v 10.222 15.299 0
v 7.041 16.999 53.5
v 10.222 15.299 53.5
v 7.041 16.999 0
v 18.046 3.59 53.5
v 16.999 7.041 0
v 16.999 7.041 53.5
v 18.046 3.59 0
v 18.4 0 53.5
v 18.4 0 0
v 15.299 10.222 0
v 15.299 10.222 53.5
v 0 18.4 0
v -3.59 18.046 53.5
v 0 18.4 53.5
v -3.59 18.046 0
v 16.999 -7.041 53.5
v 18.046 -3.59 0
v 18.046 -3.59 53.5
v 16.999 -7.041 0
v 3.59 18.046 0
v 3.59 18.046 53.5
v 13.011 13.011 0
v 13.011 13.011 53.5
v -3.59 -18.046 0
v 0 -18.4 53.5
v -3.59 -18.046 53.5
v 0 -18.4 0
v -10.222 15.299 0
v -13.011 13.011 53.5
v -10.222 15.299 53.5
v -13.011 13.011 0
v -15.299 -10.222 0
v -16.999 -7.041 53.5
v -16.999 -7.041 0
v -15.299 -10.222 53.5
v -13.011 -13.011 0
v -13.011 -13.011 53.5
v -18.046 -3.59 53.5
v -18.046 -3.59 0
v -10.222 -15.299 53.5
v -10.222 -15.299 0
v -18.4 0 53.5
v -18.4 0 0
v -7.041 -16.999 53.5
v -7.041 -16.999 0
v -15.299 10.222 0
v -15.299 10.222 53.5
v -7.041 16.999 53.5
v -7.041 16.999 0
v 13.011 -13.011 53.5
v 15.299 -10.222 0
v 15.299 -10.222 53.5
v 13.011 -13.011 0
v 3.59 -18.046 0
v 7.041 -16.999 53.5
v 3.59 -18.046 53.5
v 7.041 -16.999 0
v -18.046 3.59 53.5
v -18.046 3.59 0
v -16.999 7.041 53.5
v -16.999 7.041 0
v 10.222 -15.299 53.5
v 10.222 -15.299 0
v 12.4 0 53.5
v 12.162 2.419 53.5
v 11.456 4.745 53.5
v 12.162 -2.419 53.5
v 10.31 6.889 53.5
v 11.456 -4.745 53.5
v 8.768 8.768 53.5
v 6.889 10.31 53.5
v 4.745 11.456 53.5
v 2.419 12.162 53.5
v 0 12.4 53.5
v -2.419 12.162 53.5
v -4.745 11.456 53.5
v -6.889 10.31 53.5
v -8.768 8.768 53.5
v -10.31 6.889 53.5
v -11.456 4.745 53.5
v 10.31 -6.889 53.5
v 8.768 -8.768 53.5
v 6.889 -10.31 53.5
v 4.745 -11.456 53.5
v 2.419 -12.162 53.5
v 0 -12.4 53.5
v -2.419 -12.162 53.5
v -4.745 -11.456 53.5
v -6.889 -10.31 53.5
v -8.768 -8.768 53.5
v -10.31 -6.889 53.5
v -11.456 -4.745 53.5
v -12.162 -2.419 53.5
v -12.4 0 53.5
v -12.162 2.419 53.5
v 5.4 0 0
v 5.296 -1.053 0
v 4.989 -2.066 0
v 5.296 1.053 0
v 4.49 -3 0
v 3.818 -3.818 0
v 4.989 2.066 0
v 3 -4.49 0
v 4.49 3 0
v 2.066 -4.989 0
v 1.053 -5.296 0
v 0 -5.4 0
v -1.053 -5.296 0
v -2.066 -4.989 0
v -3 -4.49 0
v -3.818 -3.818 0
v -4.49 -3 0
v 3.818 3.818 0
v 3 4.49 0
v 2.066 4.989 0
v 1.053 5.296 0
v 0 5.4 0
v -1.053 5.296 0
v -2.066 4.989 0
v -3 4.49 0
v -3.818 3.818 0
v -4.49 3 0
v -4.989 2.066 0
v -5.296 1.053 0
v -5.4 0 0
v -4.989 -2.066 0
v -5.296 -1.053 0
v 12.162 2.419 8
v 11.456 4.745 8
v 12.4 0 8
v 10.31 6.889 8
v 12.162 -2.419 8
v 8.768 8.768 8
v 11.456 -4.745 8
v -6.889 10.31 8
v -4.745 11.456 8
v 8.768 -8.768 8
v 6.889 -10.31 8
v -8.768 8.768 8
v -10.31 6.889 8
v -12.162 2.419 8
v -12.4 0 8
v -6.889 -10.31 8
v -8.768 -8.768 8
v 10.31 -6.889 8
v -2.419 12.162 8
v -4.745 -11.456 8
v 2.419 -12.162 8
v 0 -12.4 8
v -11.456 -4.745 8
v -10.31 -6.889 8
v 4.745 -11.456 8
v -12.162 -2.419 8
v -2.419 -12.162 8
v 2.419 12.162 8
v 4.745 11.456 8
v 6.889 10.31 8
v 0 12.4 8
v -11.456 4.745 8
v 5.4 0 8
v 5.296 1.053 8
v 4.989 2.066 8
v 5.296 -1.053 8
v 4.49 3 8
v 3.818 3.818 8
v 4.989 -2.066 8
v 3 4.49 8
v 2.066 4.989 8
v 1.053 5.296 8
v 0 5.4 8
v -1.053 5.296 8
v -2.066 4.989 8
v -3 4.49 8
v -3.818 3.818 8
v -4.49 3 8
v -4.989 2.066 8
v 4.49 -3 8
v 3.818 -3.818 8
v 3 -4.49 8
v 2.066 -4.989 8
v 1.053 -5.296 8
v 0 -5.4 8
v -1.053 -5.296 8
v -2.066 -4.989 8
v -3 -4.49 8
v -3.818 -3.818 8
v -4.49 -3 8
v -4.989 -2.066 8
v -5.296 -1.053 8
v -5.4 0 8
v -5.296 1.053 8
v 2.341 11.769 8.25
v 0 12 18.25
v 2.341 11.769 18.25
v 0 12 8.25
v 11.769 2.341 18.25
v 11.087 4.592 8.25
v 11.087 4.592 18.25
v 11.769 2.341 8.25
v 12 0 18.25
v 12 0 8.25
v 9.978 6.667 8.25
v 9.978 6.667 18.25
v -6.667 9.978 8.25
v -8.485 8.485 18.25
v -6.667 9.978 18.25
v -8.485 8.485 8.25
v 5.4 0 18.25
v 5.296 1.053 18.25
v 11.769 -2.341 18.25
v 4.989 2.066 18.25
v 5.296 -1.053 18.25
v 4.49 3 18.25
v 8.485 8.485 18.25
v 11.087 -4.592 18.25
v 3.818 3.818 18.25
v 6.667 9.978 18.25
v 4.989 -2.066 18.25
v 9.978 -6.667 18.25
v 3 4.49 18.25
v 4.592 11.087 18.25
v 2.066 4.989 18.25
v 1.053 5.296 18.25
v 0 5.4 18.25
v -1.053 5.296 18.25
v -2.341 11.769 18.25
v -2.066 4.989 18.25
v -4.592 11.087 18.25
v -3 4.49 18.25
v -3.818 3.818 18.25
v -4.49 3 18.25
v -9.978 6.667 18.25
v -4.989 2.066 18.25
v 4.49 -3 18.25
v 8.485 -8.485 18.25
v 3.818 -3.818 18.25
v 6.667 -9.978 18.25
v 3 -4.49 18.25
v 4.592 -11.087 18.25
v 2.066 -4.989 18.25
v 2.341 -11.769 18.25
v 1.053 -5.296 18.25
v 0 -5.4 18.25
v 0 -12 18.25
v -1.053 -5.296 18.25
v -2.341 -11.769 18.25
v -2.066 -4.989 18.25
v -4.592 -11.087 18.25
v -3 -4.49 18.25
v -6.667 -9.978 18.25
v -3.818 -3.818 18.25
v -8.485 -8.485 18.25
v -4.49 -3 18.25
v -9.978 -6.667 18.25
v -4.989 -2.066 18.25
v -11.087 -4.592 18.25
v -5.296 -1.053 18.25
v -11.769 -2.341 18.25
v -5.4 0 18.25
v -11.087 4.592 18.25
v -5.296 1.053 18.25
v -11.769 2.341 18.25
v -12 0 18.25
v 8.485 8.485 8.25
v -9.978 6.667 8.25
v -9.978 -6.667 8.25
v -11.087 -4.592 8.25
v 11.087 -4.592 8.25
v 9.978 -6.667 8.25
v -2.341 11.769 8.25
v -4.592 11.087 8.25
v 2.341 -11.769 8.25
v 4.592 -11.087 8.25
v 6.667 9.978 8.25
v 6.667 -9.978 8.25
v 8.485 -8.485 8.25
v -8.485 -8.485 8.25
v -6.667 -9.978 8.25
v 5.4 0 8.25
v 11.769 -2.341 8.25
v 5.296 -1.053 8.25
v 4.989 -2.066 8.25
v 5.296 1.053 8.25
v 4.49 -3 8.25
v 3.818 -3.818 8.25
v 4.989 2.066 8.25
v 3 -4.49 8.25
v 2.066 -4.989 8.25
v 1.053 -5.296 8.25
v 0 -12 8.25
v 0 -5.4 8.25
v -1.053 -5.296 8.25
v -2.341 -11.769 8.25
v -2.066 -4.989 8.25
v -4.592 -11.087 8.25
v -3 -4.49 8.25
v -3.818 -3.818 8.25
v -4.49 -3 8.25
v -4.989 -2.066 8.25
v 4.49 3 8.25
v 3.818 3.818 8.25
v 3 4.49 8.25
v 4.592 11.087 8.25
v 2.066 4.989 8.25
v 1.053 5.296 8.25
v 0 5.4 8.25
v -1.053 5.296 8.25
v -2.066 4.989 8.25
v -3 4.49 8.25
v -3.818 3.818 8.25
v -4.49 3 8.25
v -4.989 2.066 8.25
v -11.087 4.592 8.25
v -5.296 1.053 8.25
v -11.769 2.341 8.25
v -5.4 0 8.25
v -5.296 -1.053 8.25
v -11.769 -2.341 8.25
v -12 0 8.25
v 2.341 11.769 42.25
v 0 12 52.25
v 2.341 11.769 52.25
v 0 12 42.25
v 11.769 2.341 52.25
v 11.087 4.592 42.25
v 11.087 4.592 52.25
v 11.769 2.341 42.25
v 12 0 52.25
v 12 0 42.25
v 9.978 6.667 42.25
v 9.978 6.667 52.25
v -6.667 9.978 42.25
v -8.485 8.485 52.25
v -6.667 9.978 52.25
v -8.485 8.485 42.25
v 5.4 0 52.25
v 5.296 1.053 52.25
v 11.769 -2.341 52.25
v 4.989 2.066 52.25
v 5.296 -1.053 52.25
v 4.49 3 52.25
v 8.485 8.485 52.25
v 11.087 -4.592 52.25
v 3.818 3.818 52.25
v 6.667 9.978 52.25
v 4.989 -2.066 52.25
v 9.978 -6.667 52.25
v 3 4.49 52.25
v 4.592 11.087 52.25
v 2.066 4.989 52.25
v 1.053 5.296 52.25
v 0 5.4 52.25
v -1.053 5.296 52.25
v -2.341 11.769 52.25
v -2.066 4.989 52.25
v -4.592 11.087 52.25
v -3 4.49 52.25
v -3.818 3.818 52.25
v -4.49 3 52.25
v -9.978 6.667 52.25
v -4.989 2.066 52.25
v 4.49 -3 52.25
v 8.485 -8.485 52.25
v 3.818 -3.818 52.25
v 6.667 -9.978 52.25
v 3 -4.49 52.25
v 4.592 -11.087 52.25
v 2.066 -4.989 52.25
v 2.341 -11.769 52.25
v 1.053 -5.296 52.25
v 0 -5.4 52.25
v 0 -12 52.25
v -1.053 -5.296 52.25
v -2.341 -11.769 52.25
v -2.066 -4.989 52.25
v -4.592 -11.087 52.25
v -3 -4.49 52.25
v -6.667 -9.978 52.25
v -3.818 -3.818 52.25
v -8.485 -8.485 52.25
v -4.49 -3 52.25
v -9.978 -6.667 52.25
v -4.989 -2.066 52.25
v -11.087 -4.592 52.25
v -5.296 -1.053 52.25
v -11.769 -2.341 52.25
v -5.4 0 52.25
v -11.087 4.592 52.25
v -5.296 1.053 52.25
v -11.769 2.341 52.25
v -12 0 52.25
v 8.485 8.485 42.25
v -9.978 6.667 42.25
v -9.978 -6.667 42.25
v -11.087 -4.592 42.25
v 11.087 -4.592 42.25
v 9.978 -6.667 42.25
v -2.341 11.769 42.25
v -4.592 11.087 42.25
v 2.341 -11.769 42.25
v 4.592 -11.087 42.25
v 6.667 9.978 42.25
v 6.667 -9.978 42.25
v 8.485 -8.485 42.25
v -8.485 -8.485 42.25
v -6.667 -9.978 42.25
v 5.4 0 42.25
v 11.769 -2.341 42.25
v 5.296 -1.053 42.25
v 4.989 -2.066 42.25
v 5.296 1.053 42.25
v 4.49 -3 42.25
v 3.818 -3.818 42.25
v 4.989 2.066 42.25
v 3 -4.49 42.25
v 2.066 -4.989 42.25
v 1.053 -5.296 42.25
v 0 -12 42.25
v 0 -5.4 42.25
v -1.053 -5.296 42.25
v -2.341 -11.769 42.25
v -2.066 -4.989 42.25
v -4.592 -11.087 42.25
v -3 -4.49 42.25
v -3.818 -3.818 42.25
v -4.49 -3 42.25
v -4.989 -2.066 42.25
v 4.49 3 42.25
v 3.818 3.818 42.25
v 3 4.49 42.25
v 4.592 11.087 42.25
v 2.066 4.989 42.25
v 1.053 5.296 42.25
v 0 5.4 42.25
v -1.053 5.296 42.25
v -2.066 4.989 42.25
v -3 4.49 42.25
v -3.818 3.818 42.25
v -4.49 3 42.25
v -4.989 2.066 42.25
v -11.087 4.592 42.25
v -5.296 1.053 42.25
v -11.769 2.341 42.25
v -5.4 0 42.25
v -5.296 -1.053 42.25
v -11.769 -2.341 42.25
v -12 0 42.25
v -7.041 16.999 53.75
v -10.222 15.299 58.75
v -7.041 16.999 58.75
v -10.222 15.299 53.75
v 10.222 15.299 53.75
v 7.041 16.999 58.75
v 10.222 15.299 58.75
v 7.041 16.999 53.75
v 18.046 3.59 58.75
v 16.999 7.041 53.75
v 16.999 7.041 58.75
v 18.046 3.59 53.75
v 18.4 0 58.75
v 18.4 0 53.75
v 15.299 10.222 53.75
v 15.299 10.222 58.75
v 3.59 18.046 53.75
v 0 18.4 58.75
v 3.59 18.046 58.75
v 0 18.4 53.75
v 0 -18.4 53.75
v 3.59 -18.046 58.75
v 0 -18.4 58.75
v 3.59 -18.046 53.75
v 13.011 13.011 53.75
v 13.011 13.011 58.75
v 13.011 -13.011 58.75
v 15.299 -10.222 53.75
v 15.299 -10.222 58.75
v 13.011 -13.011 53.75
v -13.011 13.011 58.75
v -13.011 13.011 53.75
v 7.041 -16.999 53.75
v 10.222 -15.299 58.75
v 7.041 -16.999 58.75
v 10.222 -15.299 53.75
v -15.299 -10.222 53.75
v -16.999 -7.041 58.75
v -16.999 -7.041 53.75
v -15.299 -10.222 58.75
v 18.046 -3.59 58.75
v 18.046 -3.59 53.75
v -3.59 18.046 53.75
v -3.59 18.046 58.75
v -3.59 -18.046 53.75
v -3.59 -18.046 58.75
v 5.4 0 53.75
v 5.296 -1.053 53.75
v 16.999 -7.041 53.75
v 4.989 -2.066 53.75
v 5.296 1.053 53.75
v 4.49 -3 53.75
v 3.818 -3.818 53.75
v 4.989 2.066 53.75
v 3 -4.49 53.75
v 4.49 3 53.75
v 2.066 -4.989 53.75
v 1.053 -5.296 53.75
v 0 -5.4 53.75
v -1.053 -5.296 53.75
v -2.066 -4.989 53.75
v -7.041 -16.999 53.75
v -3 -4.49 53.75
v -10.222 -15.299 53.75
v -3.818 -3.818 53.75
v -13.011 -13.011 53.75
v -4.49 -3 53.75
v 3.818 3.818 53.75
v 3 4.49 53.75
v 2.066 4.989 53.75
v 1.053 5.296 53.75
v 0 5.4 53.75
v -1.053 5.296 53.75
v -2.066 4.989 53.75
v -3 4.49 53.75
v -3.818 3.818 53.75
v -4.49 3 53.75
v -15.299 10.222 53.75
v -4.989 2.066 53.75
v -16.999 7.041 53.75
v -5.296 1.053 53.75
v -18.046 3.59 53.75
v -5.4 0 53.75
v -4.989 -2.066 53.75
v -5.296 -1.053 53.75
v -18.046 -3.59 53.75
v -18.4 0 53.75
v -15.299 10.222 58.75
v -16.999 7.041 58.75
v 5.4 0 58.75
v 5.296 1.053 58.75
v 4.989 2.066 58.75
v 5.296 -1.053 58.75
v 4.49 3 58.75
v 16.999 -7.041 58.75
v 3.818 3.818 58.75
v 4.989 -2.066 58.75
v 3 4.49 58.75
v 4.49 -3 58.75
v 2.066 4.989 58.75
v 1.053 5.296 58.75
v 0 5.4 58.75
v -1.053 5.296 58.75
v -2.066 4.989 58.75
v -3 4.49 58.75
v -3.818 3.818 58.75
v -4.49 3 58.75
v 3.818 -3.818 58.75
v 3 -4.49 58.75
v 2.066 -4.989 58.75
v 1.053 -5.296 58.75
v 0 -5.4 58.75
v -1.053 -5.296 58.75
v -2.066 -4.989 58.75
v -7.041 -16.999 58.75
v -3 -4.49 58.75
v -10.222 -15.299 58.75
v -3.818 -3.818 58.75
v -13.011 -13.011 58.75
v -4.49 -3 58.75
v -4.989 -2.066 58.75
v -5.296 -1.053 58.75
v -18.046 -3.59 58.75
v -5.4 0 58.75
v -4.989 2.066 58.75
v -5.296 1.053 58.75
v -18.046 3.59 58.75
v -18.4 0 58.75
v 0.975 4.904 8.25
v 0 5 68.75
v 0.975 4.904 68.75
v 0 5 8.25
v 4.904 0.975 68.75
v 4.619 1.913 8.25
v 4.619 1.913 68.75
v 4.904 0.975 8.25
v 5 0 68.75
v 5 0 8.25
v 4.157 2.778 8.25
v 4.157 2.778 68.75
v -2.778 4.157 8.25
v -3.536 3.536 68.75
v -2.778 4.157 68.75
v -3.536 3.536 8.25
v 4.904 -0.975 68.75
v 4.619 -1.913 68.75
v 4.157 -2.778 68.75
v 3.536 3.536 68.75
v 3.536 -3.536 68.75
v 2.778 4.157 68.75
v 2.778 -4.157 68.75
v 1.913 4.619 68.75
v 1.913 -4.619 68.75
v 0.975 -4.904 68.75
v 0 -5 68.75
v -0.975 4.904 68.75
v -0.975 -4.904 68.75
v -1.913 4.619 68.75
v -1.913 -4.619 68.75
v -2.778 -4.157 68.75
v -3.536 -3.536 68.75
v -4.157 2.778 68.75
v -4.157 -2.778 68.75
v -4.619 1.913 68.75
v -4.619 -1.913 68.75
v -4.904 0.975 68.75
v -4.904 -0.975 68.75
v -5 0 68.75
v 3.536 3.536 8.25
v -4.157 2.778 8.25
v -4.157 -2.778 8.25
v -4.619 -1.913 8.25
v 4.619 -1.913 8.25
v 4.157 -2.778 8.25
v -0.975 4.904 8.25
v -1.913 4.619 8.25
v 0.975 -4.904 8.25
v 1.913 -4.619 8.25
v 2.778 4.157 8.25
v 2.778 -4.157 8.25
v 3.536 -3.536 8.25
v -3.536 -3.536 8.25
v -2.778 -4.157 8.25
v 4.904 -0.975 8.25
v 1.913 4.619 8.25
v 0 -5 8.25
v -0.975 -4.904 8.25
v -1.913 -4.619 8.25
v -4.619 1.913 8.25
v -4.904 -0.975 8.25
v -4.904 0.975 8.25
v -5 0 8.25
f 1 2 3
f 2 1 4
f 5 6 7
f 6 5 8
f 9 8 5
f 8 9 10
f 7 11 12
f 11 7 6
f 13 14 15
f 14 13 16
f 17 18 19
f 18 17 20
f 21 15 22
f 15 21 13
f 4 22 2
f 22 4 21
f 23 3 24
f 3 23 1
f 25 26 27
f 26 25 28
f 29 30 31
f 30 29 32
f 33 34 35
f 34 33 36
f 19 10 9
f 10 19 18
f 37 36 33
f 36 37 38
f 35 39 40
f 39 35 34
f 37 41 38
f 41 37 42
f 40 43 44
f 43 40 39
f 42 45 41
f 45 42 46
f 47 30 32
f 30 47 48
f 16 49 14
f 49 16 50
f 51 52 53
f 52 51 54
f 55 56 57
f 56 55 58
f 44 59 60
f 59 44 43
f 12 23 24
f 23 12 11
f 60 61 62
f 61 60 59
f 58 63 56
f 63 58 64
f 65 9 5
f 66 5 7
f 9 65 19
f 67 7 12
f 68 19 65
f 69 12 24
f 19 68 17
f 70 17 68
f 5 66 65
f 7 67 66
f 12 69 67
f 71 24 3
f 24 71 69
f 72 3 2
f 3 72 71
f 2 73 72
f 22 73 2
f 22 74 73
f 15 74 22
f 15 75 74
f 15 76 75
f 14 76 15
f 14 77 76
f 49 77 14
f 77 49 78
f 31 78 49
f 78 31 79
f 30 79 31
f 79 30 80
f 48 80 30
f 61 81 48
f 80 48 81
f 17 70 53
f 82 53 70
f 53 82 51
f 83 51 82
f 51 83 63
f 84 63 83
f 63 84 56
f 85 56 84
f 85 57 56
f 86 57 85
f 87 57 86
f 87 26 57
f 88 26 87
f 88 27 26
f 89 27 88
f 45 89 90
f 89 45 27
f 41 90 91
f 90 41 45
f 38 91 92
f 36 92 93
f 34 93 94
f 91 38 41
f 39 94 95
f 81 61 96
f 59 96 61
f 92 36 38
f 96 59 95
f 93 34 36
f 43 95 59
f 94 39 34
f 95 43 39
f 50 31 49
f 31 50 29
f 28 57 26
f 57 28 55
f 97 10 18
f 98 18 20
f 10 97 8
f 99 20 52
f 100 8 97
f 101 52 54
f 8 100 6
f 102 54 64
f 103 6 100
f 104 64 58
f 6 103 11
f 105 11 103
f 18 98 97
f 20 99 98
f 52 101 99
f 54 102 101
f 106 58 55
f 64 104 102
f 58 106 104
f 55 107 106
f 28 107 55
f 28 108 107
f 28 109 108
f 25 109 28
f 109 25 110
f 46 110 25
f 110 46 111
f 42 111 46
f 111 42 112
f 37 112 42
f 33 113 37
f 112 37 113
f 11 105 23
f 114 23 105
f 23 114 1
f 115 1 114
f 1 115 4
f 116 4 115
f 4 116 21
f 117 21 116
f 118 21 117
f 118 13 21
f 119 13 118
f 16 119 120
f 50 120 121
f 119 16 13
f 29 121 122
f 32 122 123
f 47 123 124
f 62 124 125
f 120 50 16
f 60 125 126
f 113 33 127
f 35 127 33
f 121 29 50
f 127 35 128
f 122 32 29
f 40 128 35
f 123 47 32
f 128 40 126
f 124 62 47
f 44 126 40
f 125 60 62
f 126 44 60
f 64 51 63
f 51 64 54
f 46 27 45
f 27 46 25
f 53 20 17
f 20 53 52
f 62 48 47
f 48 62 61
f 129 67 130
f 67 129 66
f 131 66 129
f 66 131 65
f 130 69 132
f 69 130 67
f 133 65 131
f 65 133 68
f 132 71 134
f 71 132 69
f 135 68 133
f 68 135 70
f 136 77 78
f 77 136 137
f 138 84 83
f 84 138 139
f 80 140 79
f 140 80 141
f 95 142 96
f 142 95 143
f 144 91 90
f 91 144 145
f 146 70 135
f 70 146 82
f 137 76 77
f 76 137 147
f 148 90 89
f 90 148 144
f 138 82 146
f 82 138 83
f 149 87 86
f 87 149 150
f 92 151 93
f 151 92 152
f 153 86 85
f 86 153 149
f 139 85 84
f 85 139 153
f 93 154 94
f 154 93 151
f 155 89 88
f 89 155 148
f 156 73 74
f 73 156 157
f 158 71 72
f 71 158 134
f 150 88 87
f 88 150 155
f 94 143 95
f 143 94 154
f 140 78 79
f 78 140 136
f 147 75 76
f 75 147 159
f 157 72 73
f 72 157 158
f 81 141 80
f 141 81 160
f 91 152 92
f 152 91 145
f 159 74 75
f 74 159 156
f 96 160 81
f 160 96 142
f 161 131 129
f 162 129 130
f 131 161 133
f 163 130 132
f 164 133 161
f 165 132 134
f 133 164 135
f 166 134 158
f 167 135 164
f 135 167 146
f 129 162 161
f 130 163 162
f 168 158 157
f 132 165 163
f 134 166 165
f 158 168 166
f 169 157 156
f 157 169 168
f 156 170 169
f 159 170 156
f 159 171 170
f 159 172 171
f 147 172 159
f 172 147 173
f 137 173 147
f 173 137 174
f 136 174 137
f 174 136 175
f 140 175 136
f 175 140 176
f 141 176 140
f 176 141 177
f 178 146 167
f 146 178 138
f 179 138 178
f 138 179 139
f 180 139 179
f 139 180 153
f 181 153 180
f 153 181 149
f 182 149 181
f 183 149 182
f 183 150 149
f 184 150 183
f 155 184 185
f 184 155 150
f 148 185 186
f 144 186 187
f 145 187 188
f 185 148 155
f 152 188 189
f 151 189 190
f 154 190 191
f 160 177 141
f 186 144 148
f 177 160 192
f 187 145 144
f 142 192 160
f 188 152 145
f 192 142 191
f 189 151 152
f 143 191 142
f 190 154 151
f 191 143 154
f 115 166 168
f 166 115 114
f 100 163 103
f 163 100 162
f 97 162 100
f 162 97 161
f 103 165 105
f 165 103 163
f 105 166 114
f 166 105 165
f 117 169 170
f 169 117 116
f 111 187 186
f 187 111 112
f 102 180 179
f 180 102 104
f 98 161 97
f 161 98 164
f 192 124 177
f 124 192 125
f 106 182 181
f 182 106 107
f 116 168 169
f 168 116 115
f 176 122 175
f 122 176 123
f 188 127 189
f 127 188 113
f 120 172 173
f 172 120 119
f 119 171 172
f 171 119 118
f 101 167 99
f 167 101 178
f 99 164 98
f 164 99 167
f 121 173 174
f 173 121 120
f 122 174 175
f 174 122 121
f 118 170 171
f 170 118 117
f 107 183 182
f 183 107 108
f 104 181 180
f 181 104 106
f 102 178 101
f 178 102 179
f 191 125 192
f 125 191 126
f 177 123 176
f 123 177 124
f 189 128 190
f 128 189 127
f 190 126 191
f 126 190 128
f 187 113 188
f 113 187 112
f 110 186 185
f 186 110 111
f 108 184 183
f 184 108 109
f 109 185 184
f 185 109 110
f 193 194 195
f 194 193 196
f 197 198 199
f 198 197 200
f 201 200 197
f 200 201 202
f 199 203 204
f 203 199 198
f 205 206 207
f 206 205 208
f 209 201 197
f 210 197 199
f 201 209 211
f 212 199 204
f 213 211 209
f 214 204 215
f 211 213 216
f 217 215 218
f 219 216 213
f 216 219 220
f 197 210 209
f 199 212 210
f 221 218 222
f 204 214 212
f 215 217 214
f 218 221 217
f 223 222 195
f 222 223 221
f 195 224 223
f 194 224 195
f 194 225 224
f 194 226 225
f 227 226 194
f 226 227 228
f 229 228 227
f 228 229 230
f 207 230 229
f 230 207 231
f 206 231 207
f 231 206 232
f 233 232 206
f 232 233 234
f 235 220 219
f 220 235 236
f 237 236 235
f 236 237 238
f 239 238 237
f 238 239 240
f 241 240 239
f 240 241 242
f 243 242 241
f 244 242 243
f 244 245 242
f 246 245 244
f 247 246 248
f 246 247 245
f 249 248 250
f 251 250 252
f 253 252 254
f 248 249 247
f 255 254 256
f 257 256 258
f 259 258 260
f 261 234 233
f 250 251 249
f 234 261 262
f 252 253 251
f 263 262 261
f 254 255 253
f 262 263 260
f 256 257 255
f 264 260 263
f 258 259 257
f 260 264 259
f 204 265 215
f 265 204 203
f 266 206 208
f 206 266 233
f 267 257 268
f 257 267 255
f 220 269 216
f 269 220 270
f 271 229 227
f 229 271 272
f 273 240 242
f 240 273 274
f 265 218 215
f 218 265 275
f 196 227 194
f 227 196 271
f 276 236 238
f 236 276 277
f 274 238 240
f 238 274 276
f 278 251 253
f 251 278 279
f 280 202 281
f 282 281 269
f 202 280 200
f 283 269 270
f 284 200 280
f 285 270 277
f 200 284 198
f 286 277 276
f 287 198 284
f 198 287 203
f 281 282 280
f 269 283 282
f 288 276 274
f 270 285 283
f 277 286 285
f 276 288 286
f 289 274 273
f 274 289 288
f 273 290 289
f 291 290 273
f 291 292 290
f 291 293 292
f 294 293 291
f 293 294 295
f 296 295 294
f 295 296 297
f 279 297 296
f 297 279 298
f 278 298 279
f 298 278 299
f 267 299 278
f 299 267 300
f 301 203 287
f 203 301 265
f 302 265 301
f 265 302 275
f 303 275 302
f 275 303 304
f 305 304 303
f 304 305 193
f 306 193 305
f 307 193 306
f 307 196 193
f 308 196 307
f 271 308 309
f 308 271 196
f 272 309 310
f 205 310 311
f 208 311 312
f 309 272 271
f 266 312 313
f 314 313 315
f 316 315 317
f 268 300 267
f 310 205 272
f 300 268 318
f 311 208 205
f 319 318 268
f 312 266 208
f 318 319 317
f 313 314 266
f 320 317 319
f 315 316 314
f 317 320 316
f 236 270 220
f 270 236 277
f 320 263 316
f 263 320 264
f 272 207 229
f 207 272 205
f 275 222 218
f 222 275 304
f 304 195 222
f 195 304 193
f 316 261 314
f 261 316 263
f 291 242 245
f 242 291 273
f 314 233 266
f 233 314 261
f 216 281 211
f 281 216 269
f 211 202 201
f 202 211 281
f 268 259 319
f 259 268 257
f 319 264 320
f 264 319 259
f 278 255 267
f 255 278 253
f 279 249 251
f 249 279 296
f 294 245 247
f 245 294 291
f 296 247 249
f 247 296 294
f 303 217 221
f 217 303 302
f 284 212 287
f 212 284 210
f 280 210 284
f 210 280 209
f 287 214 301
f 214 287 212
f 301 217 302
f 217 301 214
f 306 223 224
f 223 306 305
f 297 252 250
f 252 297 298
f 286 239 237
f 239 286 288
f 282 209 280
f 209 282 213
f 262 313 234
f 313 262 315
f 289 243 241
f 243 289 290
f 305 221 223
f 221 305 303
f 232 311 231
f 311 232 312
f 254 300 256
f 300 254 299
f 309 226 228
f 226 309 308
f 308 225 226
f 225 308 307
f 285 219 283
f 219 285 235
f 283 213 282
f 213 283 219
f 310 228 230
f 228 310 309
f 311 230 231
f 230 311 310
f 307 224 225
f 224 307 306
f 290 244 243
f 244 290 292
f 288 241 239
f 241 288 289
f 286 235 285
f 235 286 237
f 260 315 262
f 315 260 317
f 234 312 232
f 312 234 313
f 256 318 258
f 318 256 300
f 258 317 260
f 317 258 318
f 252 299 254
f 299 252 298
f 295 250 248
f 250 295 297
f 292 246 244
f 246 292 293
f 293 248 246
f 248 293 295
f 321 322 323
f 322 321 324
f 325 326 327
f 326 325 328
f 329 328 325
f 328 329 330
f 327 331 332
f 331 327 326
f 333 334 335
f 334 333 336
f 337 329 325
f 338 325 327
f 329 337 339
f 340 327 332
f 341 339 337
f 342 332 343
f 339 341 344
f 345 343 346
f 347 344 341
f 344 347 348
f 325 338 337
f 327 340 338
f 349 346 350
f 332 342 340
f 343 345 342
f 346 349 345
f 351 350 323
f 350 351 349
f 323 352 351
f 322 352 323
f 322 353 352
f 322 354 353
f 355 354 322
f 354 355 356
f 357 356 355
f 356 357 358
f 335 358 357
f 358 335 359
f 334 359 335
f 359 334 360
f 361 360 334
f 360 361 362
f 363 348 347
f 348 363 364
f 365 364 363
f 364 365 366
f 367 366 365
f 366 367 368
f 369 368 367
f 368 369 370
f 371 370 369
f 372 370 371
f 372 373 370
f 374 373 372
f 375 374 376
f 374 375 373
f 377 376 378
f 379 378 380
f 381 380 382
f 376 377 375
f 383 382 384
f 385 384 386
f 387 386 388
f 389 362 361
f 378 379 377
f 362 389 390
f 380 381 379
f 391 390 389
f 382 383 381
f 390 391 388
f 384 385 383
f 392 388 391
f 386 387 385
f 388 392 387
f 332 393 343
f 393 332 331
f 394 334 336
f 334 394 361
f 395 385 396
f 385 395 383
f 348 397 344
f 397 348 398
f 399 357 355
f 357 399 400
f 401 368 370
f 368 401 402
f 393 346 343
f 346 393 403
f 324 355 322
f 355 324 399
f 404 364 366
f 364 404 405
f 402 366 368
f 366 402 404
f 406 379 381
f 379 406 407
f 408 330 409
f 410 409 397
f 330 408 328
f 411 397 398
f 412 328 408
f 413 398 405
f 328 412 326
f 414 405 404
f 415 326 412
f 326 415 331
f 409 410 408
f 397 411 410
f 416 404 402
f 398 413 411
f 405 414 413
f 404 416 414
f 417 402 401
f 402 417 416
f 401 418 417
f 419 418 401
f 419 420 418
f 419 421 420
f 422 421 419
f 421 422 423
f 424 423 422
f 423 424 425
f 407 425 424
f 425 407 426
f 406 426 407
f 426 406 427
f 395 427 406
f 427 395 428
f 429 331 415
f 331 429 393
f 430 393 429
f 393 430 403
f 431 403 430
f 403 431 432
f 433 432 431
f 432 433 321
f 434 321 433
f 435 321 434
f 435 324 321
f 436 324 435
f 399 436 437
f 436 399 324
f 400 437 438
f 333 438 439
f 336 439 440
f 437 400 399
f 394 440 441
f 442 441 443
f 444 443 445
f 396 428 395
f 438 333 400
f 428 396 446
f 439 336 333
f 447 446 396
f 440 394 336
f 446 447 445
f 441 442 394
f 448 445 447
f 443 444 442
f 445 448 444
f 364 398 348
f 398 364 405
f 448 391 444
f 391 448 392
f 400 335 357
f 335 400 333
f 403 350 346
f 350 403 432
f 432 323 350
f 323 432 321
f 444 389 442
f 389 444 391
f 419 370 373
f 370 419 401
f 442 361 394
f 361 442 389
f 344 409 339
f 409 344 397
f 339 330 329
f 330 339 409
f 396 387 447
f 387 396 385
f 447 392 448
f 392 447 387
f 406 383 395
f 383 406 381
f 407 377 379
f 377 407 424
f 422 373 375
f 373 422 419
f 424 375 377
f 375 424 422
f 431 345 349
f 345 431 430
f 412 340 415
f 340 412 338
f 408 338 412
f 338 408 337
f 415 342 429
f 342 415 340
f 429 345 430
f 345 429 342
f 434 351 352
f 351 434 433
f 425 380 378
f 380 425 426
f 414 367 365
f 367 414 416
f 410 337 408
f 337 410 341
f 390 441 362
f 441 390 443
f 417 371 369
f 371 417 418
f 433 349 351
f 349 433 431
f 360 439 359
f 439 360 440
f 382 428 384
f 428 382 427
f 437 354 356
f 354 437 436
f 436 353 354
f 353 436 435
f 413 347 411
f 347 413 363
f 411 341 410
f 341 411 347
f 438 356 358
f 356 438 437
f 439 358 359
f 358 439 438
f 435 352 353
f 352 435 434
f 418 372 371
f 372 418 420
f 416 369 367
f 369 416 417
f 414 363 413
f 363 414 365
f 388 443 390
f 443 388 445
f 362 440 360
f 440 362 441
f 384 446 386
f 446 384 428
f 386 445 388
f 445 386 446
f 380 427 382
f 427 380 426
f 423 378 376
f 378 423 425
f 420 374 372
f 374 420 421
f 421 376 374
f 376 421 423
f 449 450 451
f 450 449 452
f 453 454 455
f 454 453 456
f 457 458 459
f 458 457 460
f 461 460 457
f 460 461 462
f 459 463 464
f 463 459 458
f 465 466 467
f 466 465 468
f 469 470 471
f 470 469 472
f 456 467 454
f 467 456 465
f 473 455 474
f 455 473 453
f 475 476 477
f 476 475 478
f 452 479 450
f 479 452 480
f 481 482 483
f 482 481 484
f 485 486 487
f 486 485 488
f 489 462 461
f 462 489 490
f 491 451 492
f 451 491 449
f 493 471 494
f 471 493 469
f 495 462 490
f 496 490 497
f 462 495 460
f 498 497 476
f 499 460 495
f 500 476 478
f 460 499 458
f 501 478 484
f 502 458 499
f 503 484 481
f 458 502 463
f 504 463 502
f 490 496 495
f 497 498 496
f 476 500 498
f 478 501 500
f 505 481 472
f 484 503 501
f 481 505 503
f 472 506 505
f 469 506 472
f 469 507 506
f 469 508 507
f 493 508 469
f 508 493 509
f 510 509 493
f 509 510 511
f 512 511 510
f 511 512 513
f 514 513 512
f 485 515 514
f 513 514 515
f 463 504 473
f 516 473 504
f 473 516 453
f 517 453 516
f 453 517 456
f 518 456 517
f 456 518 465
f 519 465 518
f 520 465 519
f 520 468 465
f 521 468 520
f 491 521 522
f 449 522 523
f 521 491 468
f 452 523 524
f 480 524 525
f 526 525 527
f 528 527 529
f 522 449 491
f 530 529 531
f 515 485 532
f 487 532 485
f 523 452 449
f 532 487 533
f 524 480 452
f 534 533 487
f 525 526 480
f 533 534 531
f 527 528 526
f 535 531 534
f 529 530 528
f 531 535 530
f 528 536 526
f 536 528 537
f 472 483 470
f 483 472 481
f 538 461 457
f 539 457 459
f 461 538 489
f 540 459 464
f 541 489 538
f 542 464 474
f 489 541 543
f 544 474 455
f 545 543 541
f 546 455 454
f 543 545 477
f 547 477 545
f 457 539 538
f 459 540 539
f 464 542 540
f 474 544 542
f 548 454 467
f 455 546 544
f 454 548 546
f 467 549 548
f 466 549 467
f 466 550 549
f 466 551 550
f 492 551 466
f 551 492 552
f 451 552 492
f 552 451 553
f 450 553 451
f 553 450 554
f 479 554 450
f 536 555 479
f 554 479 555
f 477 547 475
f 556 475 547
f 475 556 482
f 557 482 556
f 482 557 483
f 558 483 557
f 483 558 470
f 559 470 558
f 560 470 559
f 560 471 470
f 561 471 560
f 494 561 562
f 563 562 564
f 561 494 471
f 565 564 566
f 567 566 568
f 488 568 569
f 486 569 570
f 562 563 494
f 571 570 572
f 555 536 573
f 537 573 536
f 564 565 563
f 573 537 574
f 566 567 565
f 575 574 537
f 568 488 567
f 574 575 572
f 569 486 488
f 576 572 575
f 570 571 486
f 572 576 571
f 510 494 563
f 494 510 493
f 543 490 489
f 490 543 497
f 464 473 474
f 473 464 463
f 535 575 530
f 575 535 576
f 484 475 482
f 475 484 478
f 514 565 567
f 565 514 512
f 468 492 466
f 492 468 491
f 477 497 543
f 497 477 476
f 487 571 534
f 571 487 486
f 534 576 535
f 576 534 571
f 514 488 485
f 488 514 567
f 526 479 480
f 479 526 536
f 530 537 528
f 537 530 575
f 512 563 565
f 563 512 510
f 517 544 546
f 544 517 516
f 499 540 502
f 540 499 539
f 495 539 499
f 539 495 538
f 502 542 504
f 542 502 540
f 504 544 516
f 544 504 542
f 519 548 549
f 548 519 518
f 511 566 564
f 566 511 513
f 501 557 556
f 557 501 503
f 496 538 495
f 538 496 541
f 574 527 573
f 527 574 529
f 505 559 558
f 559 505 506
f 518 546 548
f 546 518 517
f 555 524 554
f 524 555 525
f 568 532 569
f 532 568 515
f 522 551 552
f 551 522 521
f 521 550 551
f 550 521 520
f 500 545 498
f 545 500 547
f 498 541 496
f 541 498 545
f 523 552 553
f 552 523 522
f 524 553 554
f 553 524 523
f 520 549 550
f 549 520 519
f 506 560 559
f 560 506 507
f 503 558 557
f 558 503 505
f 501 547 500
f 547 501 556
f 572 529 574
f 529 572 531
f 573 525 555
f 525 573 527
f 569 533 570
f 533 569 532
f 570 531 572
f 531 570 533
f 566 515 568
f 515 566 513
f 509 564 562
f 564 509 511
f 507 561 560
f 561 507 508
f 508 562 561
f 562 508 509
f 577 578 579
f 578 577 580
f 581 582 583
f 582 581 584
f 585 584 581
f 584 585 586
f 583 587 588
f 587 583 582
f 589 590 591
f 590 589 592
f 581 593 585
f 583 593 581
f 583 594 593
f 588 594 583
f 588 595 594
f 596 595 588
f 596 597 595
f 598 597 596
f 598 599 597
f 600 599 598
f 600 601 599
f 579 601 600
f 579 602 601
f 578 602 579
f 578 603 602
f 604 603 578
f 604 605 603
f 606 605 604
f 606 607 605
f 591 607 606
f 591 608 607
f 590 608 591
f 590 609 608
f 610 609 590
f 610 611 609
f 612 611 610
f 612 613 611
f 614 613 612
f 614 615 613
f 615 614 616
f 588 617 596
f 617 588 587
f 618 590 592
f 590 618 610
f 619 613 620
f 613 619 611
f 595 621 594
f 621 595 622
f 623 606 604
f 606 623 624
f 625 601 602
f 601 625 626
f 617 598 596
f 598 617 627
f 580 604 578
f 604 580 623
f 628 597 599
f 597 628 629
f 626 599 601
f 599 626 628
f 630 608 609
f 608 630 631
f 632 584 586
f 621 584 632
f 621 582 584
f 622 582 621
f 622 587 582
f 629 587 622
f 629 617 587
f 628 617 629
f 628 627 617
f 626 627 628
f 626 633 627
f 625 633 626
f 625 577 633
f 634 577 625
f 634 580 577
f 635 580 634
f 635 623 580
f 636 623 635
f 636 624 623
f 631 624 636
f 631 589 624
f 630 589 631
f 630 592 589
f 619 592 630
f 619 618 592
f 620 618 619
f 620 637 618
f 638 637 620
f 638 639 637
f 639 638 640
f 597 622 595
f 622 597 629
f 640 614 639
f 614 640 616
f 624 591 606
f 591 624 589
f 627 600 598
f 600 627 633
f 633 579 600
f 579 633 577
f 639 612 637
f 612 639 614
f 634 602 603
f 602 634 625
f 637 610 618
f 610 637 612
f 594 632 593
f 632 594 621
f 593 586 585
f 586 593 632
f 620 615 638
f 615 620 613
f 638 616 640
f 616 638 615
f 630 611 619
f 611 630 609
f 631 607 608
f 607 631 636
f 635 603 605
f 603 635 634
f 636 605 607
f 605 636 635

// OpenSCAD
$fn = 32;

// ------------------------------------------------------------------------
// Shaft station: cup d36.8 x 53.5 mm, shaft d10
// Every part is its own module, assembly() places every instance.
// ------------------------------------------------------------------------

// --- part 1 ---
module housing_cup() {
  difference() {
    cylinder(h = 53.5, d = 36.8);
    translate([0, 0, 8]) cylinder(h = 46.5, d = 24.8);
    translate([0, 0, -1]) cylinder(h = 10, d = 10.8);
  }
}

// --- part 2 ---
module bearing_lower() {
  difference() {
      translate([0, 0, 0]) cylinder(h = 10, d = 24);
      translate([0, 0, -1]) cylinder(h = 12, d = 10.8);
    }
}

// --- part 3 ---
module bearing_upper() {
  difference() {
      translate([0, 0, 0]) cylinder(h = 10, d = 24);
      translate([0, 0, -1]) cylinder(h = 12, d = 10.8);
    }
}

// --- part 4 ---
module station_shaft() {
  translate([0, 0, -30.25]) cylinder(h = 60.5, d = 10);
}

// --- part 5 ---
module station_cover() {
  difference() {
    cylinder(h = 5, d = 36.8);
    translate([0, 0, -1]) cylinder(h = 7, d = 10.8);
  }
}

// --- assembly ---
module assembly() {
  color([0.80, 0.24, 0.20]) translate([0, 0, 0]) rotate([0, 0, 0]) housing_cup();
  color([0.20, 0.45, 0.75]) translate([0, 0, 8.25]) rotate([0, 0, 0]) bearing_lower();
  color([0.25, 0.62, 0.32]) translate([0, 0, 42.25]) rotate([0, 0, 0]) bearing_upper();
  color([0.92, 0.70, 0.18]) translate([0, 0, 38.5]) rotate([0, 0, 0]) station_shaft();
  color([0.58, 0.35, 0.70]) translate([0, 0, 53.75]) rotate([0, 0, 0]) station_cover();
}

assembly();
